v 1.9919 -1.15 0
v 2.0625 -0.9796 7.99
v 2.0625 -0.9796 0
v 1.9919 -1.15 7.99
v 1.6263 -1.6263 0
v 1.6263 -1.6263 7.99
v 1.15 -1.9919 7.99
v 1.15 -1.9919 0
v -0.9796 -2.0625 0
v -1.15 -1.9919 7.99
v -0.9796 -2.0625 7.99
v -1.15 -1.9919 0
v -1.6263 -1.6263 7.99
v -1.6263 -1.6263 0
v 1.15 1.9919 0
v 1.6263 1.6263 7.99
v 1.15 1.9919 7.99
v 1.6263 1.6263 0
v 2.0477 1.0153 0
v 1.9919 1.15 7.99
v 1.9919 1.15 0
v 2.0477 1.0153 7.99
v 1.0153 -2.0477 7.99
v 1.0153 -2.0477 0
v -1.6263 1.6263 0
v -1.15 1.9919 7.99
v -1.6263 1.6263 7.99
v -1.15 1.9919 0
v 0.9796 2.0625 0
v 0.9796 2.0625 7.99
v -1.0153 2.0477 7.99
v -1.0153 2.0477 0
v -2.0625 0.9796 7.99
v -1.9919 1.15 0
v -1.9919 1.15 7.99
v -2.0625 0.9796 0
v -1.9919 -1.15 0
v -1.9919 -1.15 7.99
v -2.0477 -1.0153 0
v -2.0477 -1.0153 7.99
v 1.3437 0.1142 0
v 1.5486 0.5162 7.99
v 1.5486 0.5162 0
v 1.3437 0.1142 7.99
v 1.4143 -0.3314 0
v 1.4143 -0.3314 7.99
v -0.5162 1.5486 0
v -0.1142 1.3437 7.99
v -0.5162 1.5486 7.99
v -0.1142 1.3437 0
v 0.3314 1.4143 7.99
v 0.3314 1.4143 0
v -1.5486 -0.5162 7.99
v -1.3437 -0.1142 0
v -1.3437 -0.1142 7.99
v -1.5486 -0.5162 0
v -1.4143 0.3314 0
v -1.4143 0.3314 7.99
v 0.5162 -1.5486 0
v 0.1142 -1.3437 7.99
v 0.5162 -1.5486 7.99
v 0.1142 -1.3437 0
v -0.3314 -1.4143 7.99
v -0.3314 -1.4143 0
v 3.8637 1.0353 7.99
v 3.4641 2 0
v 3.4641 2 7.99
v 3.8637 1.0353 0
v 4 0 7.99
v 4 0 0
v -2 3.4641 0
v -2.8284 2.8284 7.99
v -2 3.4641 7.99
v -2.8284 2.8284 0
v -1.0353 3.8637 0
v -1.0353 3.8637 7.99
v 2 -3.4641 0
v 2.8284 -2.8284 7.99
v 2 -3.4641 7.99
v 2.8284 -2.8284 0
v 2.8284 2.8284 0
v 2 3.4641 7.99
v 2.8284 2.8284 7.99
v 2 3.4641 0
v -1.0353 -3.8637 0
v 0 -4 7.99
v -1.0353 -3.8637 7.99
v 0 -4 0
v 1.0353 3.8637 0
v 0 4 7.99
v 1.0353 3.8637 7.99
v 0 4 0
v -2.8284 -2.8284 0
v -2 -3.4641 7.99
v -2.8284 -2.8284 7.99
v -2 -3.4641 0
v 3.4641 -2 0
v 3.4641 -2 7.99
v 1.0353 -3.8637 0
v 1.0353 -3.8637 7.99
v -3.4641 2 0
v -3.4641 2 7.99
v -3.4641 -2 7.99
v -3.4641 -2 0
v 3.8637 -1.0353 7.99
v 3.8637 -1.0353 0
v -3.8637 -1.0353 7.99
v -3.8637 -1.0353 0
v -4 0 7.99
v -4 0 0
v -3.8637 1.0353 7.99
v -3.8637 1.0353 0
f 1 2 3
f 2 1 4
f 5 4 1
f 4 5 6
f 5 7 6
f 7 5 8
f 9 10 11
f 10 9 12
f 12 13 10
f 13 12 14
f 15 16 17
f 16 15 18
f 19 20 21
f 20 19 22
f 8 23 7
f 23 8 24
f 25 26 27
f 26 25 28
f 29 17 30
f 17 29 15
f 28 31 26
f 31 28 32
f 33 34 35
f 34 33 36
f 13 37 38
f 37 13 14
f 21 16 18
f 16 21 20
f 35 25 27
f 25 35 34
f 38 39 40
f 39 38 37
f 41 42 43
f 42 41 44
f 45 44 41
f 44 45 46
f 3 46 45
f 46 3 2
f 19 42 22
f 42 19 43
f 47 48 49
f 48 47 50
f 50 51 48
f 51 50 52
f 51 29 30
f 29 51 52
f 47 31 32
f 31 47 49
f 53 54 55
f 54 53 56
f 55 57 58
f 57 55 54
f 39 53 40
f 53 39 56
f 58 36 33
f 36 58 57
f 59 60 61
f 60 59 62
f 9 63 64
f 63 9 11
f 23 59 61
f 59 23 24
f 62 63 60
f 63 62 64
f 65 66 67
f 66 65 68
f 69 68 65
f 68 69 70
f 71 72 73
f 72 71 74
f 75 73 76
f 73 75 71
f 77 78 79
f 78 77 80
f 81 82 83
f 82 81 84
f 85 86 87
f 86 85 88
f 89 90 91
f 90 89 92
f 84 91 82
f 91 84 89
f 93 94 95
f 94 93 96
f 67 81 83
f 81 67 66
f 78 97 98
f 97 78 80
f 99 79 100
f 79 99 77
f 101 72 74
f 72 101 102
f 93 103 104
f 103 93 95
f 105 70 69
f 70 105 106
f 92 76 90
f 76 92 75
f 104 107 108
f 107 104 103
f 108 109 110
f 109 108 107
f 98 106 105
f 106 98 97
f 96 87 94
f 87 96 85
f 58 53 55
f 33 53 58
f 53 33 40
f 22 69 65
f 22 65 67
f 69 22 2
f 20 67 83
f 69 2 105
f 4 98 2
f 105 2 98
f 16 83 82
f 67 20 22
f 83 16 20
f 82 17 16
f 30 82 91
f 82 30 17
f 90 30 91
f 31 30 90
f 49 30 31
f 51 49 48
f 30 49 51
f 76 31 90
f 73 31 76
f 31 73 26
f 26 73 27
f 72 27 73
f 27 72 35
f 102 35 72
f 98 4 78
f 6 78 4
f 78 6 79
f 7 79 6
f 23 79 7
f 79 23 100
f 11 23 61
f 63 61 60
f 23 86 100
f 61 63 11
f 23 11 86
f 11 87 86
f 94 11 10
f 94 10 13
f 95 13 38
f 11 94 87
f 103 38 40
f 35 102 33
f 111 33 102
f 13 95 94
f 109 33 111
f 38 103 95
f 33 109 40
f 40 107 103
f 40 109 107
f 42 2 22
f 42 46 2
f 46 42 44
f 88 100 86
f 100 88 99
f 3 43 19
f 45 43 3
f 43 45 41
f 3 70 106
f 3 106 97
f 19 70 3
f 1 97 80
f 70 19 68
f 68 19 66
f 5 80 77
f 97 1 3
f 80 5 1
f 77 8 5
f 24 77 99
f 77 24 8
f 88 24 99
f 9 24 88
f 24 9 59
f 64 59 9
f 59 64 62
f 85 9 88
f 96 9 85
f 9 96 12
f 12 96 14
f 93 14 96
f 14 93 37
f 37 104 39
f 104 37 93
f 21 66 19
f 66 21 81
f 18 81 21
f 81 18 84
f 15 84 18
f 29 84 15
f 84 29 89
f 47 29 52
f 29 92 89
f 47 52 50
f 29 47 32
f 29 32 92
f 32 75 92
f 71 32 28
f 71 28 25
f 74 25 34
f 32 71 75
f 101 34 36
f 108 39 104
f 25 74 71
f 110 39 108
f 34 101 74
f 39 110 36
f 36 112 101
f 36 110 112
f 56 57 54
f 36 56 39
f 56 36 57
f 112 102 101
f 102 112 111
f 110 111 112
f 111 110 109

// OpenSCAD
// file: PELA-technic-axle.scad
/*
PELA Parametric LEGO-compatible Technic Axle

PELA Parametric Blocks - 3D Printed LEGO-compatible parametric blocks

Published at https://PELAblocks.org

By Paul Houghton
Twitter: @mobile_rat
Email: paulirotta@gmail.com
Blog: https://medium.com/@paulhoughton

Creative Commons Attribution-ShareAlike 4.0 International License
    https://creativecommons.org/licenses/by-sa/4.0/legalcode

Open source design, Powered By Futurice. Come work with the best.
    https://www.futurice.com/
*/

include <../style.scad>
include <../material.scad>
use <../PELA-block.scad>


/* [Render] */

// Show the inside structure [mm]
_cut_line = 0; // [0:0.5:5]

// Printing material (set to select calibrated knob, socket and axle hole fit)
_material = 0; // [0:PLA, 1:ABS, 2:PET, 3:Biofila Silk, 4:Pro1, 5:NGEN, 6:NGEN FLEX, 7:Bridge Nylon, 8:TPU95, 9:TPU85/NinjaFlex, 10:Polycarbonite]

// Is the printer nozzle >= 0.5mm? If so, some features are enlarged to make printing easier
_large_nozzle = true;


/* [Technic Axle] */

// Axle length [blocks]
_l = 3; // [1:1:20]

// An axle which fits loosely in a technic bearing hole [mm]
_axle_radius = 2.2; // [0.2:0.1:3.9]

// Size of the hollow inside an axle [mm]
_center_radius = 1.1; // [0.0:0.1:3.8]


/* [Technic Axle] */
_defeather = 0.001;


///////////////////////////////
// DISPLAY
///////////////////////////////

axle(material=_material, large_nozzle=_large_nozzle, cut_line=_cut_line, l=_l, axle_radius=_axle_radius, center_radius=_center_radius);
  



/////////////////////////////////////
// MODULES
/////////////////////////////////////

module axle(material, large_nozzle, cut_line=_cut_line, l, axle_radius, center_radius) {
    
    assert(material!=undef);
    assert(large_nozzle!=undef);
    assert(cut_line!=undef);
    assert(l>=0);
    assert(axle_radius>=0);
    assert(center_radius>=0);

    axle_length = block_width(l);

    difference() {
        cylinder(r=axle_radius, h=axle_length);

        union() {
            translate([0, 0, -_defeather]) {
                if (center_radius > 0 && axle_length > 0)
                    cylinder(r=center_radius, h=axle_length + 2*_defeather);
            }

            translate([-axle_radius, -axle_radius, 0]) {
                cut_space(material=material, large_nozzle=large_nozzle, l=l, w=1, cut_line=cut_line, h=l, block_height=_block_height, knob_height=_knob_height, skin=0);
            }
        }
    }
}
// file: PELA-technic-cross-axle.scad
/*
Parametric PELA LEGO-compatible technic cross-shaped rotational drive Axle

PELA Parametric Blocks - 3D Printed LEGO-compatible parametric blocks

By Paul Houghton
Twitter: @mobile_rat
Email: paulirotta@gmail.com
Blog: https://medium.com/@paulhoughton

Creative Commons Attribution-ShareAlike 4.0 International License
    https://creativecommons.org/licenses/by-sa/4.0/legalcode

Open source design, Powered By Futurice. Come work with the best.
    https://www.futurice.com/
*/

include <../style.scad>
include <../material.scad>
use <../PELA-block.scad>
use <PELA-technic-axle.scad>


/* [Render] */

// Printing material (set to select calibrated knob, socket and axle hole fit)
_material = 0; // [0:PLA, 1:ABS, 2:PET, 3:Biofila Silk, 4:Pro1, 5:NGEN, 6:NGEN FLEX, 7:Bridge Nylon, 8:TPU95, 9:TPU85/NinjaFlex, 10:Polycarbonite]

// Is the printer nozzle >= 0.5mm? If so, some features are enlarged to make printing easier
_large_nozzle = true;


/* [Technic Cross Axle] */

// Axle length [blocks]
_l = 3; // [1:1:20]

// Outside radius of an axle which fits loosely in a technic bearing hole [mm]
_axle_radius = 2.2; // [0.1:1:20]

// Size of the axle solid center before rounding [mm]
_center_radius = 0.73; // [0.1:0.01:4]

// Cross axle inside rounding radius [mm]
_axle_rounding = 0.63; // [0.2:0.01:4.0]



///////////////////////////////
// DISPLAY
///////////////////////////////


cross_axle(material=_material, large_nozzle=_large_nozzle, l=_l, axle_rounding=_axle_rounding, axle_radius=_axle_radius, center_radius=_center_radius);
    




/////////////////////////////////////
// MODULES
/////////////////////////////////////

module cross_axle(material, large_nozzle, l, axle_rounding, axle_radius, center_radius) {

    assert(material!=undef);
    assert(large_nozzle!=undef);
    assert(l!=undef);
    assert(axle_rounding!=undef);
    assert(axle_radius!=undef);
    assert(center_radius!=undef);

    axle_length = block_width(l);

    rotate([90, 45, 0]) {
        difference() {
            axle(material=material, cut_line=0, large_nozzle=large_nozzle, l=l, axle_radius=axle_radius, center_radius=0);
            
            axle_cross_negative_space(material=material, large_nozzle=large_nozzle, axle_length=axle_length, axle_rounding=axle_rounding, axle_radius=axle_radius);
        }
    }
}


// That which is cut away four times from a solid to create a cross axle
module axle_cross_negative_space(material, large_nozzle, axle_length, axle_rounding, axle_radius) {
    
    assert(material!=undef);
    assert(large_nozzle!=undef);
    assert(axle_length!=undef);
    assert(axle_rounding!=undef);
    assert(axle_radius!=undef);

    for (rot=[0:90:270]) {
        rotate([0, 0, rot]) {
            hull() {
                translate([axle_rounding*2, axle_rounding*2, -_defeather]) {
                    cylinder(r=axle_rounding, h=axle_length+2*_defeather);

                    translate([axle_radius, 0, 0]) {
                        cylinder(r=axle_rounding, h=axle_length+2*_defeather);
                    }

                    translate([0, axle_radius, 0]) {
                        cylinder(r=axle_rounding, h=axle_length+2*_defeather);
                    }
                }
            }
        }
    }
}
// file: ../style.scad
/*
PELA Parametric Block Style

Alter the baseline style of all designs. Many designs will locally override some but not all of these parameters.

Published at https://PELAblocks.org

By Paul Houghton
Twitter: @mobile_rat
Email: paulirotta@gmail.com
Blog: https://medium.com/@paulhoughton

Creative Commons Attribution-ShareAlike 4.0 International License
    https://creativecommons.org/licenses/by-sa/4.0/legalcode

Open source design, Powered By Futurice. Come work with the best.
    https://www.futurice.com/

Import this into other design files to set baseline constants:
    include <style.scad>

If the nozzle you normally use on your printer is 0.5mm or less, edit line 31 to read:
    31:     large_nozzle = false; // [true:nozzle >= 0.5mm, false:nozzle < 0.5mm]

There are many other parameters here which affect all generated PELA models. Any changes you make here affect all models unless that parameter is locally updated in a given model. Where models duplicate these settings, the local value will appear in the "Customizer" view of OpenSCAD. Think of those local overrides of these default style settings as a design decision: changing that parameter for that particular model is likely to be useful to you.

*/

include <material.scad>


/* [Block] */

// Presence of bottom connector sockets
_sockets = true;

// Presence of top connector knobs
_knobs = true;

// Place holes in the corners for mountings screws (0=>no holes, 1=>holes)
_corner_bolt_holes = false;

// Size of corner holes for M3 mountings bolts
_bolt_hole_radius = 1.6; // [0.0:0.1:3.0]

// Add interior fill for the base layer
_solid_first_layer = false;

// Add interior fill for upper layers
_solid_upper_layers = true;


/* [Knob] */

// Knob top surface strength
_knob_top_thickness = 1.0;

// Height of traditional connectors [mm] (taller gives a stronger hold)
_knob_height = 2.9; // [0:disabled, 1.8:traditional, 2.9:PELA 3D print tall]

// Size of a hole in the top of each knob. Set 0 to disable for best flexture or enable for air circulation/aesthetics/drain resin
_knob_vent_radius = 0.0; // [0.0:0.1:4]

// Ease insertion by slightly widening the socket entry
_bevel_socket = true;

// Height of a small bottom knob insert easement, flaring the bottom edges to make assembly easier
_socket_insert_bevel = 0.1;




/* [Technic] */

// Technic connector hole
//axle_hole_radius = 2.45 + axle_hole_tweak;

// Add full width through holes spaced along the length for techic connectors
_side_holes = 3; // [0:disabled, 1:short air vents, 2:short connectors, 3:full width connectors]

// Add a wrapper around side holes (disable for extra ventilation but loose lock notches)
_side_sheaths = true;

// Add short end holes spaced along the width for techic connectors
_end_holes = 2; // [0:disabled, 1:short air vents, 2:short connectors, 3:full length connectors]

// Add a wrapper around end holes (disable for extra ventilation but loose lock notches)
_end_sheaths = true;

// Add holes in the top deck to improve airflow and reduce weight
_top_vents = false;


/* [Shell] */

// Thickness of the solid top surface of the block
_top_shell = 1;


/* [Advanced Block] */

// Basic unit vertical size of each block
_block_height = 8; // [8:technic, 9.6:traditional knobs]

// Horizontal clearance space removed from the outer horizontal surface to allow two parts to be placed next to one another on a 8mm grid [mm]
_skin = 0.1; // [0:0.02:0.5]

// Height of the hole beneath each knob which facilitates click lock in low-flex materials by variable side pressure on any block above
_knob_flexture_height = 4.5;

// Width of horizontal surface strengthening slats between the bottom rings
_bottom_stiffener_width = 2.6;

// Height of horizontal surface strengthening slats (appears between the bottom rings, default is material.scad:knob_height)
_bottom_stiffener_height = _knob_height;


/* [Advanced Technic] */

// Technic connector hole inset radius
_counterbore_inset_radius = 3.1; // [0.1:0.1:4]

// Technic connector hole inset depth
_counterbore_inset_depth = 0.95; // [0.1:0.1:4]

// Contact length of axle to block (not including inset length and end snap fit flexture in peg connectors)
_peg_length = 6.5; // [0.1:0.1:16]

// Size of the cylinder wrapped around the technic holes
_bearing_sheath_thickness = 0.9; // [0.1:0.1:4]


/* [Block Aesthetics] */

// Width of a line etched in the side of multi-layer block sets (0 to disable)
_ridge_width = 0.15; // [0.1:0.05:4]

// Depth of a line etched in the side of multi-layer block sets
_ridge_depth = 0.3; // [0.1:0.05:4]


/* [Baked Print Supports] */

// Generate print-time support aid structures for models which offer this. Turn this off if you will use slicer-generated print supports, but be aware that these may make the bottom connectors difficult to post process.
_print_supports = true;

// Space between support/support.scad and the part)
_support_offset_from_part = 0.1; // [0.0:0.01:1]

// Thickness of each rotating layer in a twisting support [mm]
_support_layer_height = 2; // [0.1:0.1:8]

// Thickness of a base panel for holding supports together [mm]
_support_connection_height = 0.5; // [0.1:0.1:8]

// Length of sides of a support equilateral triangle [mm]
_support_side_length = 4; // [0.1:0.1:16]

// Per layer support rotation for strength [degrees]
_support_layer_rotation = 6; // [1:179]

// Reverse direction of support rotation periodically to constrain size [degrees] (0 to disable)
_support_max_rotation = 0; // [0:360]


/* [Hidden] */

// Basic unit horizontal size of each block
_block_width = 8; // [8:technic and traditional blocks]

// Height of the connectors commercial blocks use [mm]
_official_knob_height = 1.8; // [1.8:traditional blocks]

// Slight visual offset to work around prevent goldfeather rendering bugs in OpenSCAD (visual, not affecting final print geometry) [mm]
_defeather = 0.01;

// Roundness of bottom connector rings (Use 8 for octagonal sockets- many parts of the geomoetry must be adjusted if you change this)
_ring_fn=8;

// Roundness of bottom connector rings (Use 8 for octagonal sockets- many parts of the geomoetry must be adjusted if you change this)
_axle_hole_fn=32;

// Minimum angle to approximate a circle
$fa = 15;

// Minimum segment length to approximate a circle
$fs = 0.5;


/////////////////////////////////////
// FUNCTIONS
/////////////////////////////////////

// Horizontal size
function block_width(i=1) = i*_block_width;

// Vertical size [mm]
function block_height(h=1, block_height) = h*block_height;

// Test if this is a corner block
function is_corner(x, y, l, w) = (x==0 || x==l-1) && (y==0 || y==w-1);

// Ratio of a flat panel thickness to a regular block thickness (1/2 for PELA 8mm tall blocks, 1/3 for LEGO 9.6mm block_height blocks)
function panel_height_ratio(block_height) = block_height < 9.6 ? 1/2 : 1/3;

// Thickness of a flat panel [mm]
function panel_height(block_height) = block_height(1, block_height=_block_height)*panel_height_ratio(block_height=_block_height);

// Bottom connector additional distance from outside lock and connector rings which small flexture-fit rims protrude inwards to grab the base of knobs for asymmetric side pressure to assist with snap fit [mm]
function side_lock_thickness(material) = is_flexible(_material) ? 0.06 : 0.02;

// Horizontal width of each side of a support triangle [mm]
function support_line_width(large_nozzle) = large_nozzle ? 0.7 : 0.5;

// Force the cut visual line for seeing inside parts to be between 0 and 1mm short of the part width [mm]
function visual_cut(cut_line, w) = max(min(cut_line, block_width(w)), 0);

// Thickness of the solid outside surface of the block [mm]
function side_shell(large_nozzle) = large_nozzle ? 1.2 : 1.0;
// main file
/*
PELA Parametric LEGO-compatible Technic Axle

PELA Parametric Blocks - 3D Printed LEGO-compatible parametric blocks

Published at https://PELAblocks.org

By Paul Houghton
Twitter: @mobile_rat
Email: paulirotta@gmail.com
Blog: https://medium.com/@paulhoughton

Creative Commons Attribution-ShareAlike 4.0 International License
    https://creativecommons.org/licenses/by-sa/4.0/legalcode

Open source design, Powered By Futurice. Come work with the best.
    https://www.futurice.com/
*/

include <../style.scad>
include <../material.scad>
use <../PELA-block.scad>
use <PELA-technic-cross-axle.scad>


/* [Render] */

// Show the inside structure [mm]
_cut_line = 0; // [0:0.5:5]

// Printing material (set to select calibrated knob, socket and axle hole fit)
_material = 9; // [0:PLA, 1:ABS, 2:PET, 3:Biofila Silk, 4:Pro1, 5:NGEN, 6:NGEN FLEX, 7:Bridge Nylon, 8:TPU95, 9:TPU85/NinjaFlex, 10:Polycarbonite]

// Is the printer nozzle >= 0.5mm? If so, some features are enlarged to make printing easier
_large_nozzle = false;


/* [Technic Cross Axle Hub] */

// Axle length [blocks]
_hub_l = 1; // [1:1:20]

// The cylinder surrounding the axle hole [mm]
_hub_radius = 4; // [0.2:0.1:3.9]

// Outside radius of an axle which fits loosely in a technic bearing hole [mm]
_axle_radius = 2.3; // [0.1:1:20]

// Size of the axle solid center before rounding [mm]
_center_radius = 0.83; // [0.1:0.01:4]

// Cross axle inside rounding radius [mm]
_axle_rounding = 0.73; // [0.2:0.01:4.0]



///////////////////////////////
// DISPLAY
///////////////////////////////

hub(material=_material, large_nozzle=_large_nozzle, hub_l=_hub_l, hub_radius=_hub_radius, axle_rounding=_axle_rounding, axle_radius=_axle_radius, center_radius=_center_radius);
  



/////////////////////////////////////
// MODULES
/////////////////////////////////////

module hub(material, large_nozzle, hub_l, hub_radius, axle_rounding=_axle_rounding, axle_radius, center_radius) {
    
    echo("hub_radius: ", hub_radius);

    assert(material!=undef);
    assert(large_nozzle!=undef);
    assert(hub_l!=undef);
    assert(hub_radius!=undef);
    assert(axle_radius!=undef);
    assert(center_radius!=undef);

    axle_length = block_width(hub_l);

    difference() {
        cylinder(r=hub_radius, h=axle_length-_defeather);

        translate([0, 0, -_defeather]) {
            rotate([-90, 0, 0]) {
                cross_axle(material=material, large_nozzle=large_nozzle, l=2*hub_l, axle_rounding=axle_rounding, axle_radius=axle_radius, center_radius=center_radius);
            }
        }
    }
}
